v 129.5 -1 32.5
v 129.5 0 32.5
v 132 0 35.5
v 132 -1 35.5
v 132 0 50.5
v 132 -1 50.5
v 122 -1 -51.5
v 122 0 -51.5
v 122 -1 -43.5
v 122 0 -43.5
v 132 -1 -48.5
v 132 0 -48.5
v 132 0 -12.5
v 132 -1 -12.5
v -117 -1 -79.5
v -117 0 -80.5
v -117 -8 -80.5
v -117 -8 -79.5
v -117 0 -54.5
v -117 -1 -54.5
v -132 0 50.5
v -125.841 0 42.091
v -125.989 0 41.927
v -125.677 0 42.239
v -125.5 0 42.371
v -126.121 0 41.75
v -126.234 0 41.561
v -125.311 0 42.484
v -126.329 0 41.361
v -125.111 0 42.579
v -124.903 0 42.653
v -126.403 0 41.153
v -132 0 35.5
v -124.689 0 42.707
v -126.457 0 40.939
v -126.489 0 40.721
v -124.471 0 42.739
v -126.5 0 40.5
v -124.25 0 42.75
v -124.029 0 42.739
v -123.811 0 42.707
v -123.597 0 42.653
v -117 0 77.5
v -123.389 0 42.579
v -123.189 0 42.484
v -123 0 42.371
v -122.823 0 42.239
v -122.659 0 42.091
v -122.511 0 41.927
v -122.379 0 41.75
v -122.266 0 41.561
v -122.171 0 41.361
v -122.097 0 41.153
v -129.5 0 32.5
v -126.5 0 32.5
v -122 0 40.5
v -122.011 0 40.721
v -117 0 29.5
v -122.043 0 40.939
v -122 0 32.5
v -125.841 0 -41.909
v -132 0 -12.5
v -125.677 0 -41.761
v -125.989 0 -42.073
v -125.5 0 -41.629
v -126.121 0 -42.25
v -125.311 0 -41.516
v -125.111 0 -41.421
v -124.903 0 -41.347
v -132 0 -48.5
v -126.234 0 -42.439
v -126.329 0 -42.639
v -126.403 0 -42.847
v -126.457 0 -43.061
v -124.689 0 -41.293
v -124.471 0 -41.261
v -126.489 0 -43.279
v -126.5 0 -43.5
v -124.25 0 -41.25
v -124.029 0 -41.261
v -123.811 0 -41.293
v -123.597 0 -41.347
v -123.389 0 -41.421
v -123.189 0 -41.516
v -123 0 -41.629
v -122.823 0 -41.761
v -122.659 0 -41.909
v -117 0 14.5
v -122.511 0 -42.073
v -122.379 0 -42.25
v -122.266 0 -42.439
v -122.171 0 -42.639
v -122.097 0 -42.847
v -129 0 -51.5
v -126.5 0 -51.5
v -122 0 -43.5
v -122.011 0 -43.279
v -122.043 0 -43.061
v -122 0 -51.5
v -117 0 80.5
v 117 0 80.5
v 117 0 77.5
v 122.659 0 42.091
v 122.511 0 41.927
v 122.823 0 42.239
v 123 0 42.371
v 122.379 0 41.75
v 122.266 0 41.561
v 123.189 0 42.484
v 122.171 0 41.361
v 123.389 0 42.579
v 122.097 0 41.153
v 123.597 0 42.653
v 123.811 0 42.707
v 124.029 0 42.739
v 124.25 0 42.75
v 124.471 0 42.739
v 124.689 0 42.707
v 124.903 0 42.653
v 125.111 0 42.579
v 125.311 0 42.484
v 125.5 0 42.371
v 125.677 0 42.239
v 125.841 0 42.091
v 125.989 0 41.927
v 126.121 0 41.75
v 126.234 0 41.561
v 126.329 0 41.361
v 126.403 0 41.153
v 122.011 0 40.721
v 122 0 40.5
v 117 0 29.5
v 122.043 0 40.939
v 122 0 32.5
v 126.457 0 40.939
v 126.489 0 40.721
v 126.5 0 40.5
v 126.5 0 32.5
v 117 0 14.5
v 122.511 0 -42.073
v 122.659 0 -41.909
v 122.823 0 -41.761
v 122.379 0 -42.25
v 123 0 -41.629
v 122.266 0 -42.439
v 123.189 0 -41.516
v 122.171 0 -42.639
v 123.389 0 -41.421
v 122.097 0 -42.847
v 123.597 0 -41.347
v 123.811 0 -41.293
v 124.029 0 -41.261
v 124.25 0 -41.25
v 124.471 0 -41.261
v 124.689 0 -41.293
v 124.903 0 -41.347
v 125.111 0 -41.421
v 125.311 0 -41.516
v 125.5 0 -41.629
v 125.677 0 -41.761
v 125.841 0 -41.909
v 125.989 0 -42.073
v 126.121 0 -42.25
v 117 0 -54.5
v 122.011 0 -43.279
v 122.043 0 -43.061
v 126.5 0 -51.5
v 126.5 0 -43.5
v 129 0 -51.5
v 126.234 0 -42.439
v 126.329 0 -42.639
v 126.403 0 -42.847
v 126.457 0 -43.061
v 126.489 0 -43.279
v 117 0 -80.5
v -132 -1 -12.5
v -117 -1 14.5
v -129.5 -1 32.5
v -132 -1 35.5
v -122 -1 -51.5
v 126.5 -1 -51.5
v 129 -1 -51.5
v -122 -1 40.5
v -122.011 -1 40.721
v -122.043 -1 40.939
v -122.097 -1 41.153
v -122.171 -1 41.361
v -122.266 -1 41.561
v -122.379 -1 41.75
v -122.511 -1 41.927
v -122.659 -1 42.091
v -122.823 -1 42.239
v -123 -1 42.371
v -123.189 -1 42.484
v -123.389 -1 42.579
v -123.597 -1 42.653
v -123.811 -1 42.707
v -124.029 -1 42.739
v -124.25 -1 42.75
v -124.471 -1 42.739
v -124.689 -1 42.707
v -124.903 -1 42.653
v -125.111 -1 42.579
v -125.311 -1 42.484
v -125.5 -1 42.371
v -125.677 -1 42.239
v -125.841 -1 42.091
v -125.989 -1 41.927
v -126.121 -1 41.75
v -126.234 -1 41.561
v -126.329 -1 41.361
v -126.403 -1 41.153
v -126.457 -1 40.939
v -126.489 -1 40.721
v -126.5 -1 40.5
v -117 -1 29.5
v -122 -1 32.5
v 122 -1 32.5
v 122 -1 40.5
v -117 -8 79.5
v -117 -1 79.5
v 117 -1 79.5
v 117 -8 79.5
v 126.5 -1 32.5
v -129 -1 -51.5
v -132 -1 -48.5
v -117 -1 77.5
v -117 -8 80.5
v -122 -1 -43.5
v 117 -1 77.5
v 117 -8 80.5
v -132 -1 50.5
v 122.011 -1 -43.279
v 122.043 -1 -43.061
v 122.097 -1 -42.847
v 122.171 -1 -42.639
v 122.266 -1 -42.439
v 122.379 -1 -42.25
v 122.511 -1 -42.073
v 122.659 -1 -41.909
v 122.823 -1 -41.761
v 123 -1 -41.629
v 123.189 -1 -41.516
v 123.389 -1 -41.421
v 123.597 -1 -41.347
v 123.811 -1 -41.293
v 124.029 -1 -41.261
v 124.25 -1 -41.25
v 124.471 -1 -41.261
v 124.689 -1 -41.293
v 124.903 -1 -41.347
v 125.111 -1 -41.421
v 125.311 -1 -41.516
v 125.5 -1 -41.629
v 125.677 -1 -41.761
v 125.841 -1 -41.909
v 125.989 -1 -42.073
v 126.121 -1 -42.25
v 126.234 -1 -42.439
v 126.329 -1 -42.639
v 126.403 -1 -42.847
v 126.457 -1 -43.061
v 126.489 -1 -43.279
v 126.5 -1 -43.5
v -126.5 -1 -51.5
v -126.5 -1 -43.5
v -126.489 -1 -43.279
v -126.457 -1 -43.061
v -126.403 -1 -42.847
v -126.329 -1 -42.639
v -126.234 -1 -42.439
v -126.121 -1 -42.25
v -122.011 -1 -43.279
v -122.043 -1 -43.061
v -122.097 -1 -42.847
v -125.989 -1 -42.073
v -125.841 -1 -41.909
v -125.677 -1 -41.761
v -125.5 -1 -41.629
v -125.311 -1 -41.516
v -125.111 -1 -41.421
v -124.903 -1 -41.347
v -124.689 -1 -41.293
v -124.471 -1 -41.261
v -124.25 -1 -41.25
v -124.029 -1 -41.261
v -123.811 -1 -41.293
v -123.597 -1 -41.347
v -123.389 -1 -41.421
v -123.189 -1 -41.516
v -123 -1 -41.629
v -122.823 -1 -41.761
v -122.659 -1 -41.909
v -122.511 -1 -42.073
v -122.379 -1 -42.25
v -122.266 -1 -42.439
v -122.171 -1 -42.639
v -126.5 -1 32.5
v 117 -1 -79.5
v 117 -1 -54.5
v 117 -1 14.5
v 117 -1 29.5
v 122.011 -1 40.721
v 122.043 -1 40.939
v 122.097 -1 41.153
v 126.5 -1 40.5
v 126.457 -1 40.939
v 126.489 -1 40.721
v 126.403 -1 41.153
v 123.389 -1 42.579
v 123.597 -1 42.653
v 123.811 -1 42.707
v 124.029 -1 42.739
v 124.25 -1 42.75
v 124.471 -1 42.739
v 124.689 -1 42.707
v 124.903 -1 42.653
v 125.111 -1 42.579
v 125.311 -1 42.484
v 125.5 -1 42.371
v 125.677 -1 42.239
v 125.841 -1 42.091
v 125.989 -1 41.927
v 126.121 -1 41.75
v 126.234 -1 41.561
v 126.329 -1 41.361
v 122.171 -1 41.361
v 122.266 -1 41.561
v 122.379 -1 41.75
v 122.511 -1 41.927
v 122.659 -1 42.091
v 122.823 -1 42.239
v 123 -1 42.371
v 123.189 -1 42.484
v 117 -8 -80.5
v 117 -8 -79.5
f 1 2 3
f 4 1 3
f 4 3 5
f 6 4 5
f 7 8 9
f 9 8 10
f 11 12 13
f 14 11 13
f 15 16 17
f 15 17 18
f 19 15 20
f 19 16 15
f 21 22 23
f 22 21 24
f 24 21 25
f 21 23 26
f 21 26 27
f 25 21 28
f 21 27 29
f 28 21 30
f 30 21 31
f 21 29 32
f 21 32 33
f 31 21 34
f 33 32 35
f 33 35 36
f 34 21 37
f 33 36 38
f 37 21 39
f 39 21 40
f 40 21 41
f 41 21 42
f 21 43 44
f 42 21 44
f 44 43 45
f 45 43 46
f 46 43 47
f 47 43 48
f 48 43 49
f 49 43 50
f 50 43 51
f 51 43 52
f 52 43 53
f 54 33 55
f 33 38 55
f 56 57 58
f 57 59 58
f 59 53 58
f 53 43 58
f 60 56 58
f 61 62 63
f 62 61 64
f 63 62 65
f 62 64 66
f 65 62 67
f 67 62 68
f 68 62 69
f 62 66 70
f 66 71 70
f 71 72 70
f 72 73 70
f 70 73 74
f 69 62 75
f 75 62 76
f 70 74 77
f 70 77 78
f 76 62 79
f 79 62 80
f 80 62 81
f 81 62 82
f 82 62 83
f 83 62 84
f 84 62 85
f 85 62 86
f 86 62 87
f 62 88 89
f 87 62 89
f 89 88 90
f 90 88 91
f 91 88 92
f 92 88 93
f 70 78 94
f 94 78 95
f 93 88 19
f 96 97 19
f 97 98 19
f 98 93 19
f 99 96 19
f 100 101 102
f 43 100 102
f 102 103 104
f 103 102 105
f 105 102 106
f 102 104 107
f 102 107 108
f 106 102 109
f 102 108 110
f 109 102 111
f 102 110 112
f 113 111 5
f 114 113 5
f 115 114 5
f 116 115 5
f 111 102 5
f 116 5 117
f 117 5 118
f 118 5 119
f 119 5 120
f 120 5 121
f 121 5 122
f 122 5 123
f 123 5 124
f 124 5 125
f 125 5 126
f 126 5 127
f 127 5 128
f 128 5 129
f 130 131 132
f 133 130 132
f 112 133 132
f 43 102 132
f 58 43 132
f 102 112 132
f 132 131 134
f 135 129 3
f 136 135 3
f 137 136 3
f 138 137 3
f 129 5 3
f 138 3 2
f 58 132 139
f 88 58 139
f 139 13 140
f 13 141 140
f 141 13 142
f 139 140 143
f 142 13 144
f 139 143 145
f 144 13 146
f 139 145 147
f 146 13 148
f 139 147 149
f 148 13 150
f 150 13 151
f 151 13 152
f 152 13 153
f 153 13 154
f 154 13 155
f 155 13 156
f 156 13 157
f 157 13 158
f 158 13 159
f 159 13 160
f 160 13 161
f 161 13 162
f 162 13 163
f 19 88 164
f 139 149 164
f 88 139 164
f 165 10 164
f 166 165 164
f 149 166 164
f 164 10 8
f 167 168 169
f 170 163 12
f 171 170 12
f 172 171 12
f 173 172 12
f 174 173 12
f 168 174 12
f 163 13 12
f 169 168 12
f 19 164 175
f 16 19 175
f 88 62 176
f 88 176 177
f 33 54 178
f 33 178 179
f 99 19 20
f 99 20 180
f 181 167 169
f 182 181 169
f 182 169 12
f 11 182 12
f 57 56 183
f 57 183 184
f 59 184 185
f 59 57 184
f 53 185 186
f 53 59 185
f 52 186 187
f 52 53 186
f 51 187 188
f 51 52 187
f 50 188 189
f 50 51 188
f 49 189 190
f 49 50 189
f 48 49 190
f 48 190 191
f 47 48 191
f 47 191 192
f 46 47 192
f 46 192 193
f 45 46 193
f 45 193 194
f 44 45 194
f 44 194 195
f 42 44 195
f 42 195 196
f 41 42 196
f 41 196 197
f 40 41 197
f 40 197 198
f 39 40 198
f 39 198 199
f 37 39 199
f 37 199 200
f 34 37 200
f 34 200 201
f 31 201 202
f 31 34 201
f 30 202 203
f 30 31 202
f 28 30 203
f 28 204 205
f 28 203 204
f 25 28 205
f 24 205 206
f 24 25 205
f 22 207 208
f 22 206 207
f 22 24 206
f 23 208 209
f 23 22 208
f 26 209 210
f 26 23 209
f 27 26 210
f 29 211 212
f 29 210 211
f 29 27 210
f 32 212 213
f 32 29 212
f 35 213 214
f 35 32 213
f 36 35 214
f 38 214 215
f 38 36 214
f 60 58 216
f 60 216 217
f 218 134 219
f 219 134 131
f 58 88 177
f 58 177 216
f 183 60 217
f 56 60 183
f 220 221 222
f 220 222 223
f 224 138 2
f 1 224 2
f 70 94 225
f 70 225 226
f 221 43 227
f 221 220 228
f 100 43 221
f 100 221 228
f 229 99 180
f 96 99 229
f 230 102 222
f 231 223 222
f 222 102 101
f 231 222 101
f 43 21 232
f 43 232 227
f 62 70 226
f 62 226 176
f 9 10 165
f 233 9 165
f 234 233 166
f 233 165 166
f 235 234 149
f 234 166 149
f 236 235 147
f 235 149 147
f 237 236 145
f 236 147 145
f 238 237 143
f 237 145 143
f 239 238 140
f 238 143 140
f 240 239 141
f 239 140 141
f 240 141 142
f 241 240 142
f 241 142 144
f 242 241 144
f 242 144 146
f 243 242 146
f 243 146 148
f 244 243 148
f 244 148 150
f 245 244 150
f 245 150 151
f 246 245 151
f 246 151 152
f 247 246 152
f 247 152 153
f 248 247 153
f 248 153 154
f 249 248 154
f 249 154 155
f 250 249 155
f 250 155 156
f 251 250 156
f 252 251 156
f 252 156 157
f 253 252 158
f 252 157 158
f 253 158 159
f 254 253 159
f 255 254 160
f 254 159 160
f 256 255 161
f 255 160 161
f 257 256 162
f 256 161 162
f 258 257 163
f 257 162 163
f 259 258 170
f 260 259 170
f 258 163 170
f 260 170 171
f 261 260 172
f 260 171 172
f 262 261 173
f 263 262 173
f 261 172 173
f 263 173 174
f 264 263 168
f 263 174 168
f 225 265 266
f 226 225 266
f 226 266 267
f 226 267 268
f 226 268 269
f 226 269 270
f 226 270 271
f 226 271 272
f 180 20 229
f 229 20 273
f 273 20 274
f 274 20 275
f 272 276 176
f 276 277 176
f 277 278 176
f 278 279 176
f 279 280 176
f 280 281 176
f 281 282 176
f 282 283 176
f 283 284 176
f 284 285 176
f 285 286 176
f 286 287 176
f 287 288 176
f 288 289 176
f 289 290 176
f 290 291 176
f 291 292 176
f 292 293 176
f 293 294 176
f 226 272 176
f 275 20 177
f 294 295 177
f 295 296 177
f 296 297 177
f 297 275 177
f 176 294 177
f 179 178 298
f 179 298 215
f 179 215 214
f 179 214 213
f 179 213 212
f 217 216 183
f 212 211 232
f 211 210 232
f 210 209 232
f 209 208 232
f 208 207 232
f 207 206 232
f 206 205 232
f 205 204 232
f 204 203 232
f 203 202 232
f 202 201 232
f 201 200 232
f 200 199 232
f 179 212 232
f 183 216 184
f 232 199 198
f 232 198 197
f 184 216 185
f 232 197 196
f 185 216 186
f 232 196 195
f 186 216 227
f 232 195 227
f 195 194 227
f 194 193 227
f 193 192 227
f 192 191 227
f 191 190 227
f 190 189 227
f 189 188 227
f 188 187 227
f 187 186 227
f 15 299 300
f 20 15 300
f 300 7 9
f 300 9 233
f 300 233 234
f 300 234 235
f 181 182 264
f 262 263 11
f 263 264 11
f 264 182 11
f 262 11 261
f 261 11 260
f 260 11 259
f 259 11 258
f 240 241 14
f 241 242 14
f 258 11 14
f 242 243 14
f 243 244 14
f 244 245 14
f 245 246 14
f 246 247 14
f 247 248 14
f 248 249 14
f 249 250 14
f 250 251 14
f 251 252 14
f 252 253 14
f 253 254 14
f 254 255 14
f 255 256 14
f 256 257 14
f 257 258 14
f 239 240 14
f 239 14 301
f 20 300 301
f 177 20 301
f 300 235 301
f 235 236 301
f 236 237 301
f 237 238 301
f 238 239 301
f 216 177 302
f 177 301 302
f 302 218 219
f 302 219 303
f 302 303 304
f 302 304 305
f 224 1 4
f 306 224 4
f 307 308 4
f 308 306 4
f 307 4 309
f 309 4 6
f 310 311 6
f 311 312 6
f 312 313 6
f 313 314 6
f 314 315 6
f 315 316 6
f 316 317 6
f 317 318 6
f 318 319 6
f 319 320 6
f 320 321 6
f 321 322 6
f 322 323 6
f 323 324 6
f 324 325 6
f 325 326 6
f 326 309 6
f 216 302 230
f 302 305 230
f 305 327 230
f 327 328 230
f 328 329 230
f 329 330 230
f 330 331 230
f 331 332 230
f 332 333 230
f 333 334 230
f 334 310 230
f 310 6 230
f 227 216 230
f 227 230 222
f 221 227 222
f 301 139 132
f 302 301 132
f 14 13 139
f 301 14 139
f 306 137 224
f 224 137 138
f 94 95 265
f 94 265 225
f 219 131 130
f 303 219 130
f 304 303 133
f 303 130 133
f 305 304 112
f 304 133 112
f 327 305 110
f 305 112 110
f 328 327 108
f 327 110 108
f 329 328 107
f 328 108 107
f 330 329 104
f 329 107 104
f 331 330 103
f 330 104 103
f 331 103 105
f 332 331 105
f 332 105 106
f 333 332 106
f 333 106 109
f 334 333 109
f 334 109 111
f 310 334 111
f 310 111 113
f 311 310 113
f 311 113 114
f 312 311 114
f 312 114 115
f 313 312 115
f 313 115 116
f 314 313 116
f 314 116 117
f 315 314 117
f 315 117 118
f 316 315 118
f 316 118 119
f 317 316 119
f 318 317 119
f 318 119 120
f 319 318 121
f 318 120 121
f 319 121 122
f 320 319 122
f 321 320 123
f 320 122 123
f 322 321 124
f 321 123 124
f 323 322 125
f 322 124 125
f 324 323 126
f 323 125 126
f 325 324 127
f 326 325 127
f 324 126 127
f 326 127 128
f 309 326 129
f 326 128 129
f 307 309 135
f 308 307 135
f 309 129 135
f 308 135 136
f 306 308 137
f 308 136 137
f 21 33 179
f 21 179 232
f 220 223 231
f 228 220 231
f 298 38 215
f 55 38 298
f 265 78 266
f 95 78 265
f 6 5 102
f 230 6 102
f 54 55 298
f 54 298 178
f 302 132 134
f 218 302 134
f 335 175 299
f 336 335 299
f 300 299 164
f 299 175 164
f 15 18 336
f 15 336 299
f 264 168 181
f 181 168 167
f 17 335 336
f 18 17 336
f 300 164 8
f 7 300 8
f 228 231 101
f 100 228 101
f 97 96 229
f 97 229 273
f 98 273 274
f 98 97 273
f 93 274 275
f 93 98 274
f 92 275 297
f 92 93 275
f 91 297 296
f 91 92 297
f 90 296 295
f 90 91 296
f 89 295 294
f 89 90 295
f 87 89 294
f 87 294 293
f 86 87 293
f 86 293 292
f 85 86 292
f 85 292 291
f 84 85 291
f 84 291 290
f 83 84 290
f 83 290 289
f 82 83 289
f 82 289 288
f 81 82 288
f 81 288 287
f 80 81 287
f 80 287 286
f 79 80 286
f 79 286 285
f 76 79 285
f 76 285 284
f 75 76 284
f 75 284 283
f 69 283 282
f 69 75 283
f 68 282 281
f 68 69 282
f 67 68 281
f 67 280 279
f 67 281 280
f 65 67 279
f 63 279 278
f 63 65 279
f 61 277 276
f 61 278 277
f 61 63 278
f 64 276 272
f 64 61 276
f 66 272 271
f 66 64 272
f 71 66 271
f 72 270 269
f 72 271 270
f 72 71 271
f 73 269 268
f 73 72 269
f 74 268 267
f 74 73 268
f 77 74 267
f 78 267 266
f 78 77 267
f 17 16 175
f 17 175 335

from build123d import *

# Parameters (mm, degrees)
EXTRUDE_THIN1_DEPTH = 132
CUT_EXTRUDE1_DEPTH  = 10


with BuildPart() as part:
    # Sketch1 → Extrude-Thin1 (new, symmetric)
    with BuildSketch(Plane(origin=(0, 0, 0), x_dir=(0, 0, -1), z_dir=(1, 0, 0))):
        Polygon((-80.5, -8), (-80.5, 0), (80.5, 0), (80.5, -8), (79.5, -8), (79.5, -1), (-79.5, -1), (-79.5, -8), align=None)
    extrude(amount=EXTRUDE_THIN1_DEPTH, both=True)

    # Sketch2 → Cut-Extrude1 (cut)
    with BuildSketch(Plane(origin=(0, 0, 0), x_dir=(1, 0, 0), z_dir=(0, 1, 0))):
        with BuildLine():
            Line((-117, 80.5), (-117, 54.5))
            Line((-117, 54.5), (-122, 51.5))
            Line((-122, 51.5), (-122, 43.5))
            ThreePointArc((-122, 43.5), (-124.25, 41.25), (-126.5, 43.5))
            Line((-126.5, 43.5), (-126.5, 51.5))
            Line((-126.5, 51.5), (-129, 51.5))
            Line((-129, 51.5), (-132, 48.5))
            Line((-132, 48.5), (-132, 12.5))
            Line((-132, 12.5), (-117, -14.5))
            Line((-117, -14.5), (-117, -29.5))
            Line((-117, -29.5), (-122, -32.5))
            Line((-122, -32.5), (-122, -40.5))
            ThreePointArc((-122, -40.5), (-124.25, -42.75), (-126.5, -40.5))
            Line((-126.5, -40.5), (-126.5, -32.5))
            Line((-126.5, -32.5), (-129.5, -32.5))
            Line((-129.5, -32.5), (-132, -35.5))
            Line((-132, -35.5), (-132, -50.5))
            Line((-132, -50.5), (-117, -77.5))
            Line((-117, -77.5), (-117, -80.5))
            Line((-117, -80.5), (-140, -80.5))
            Line((-140, -80.5), (-140, 80.5))
            Line((-140, 80.5), (-117, 80.5))
        make_face()
    cut_extrude1 = extrude(amount=-CUT_EXTRUDE1_DEPTH, mode=Mode.SUBTRACT)

    # Mirror1: Cut-Extrude1 across plane
    add(cut_extrude1.mirror(Plane(origin=(0, 0, 0), x_dir=(0, 0, 1), z_dir=(1, 0, 0))), mode=Mode.SUBTRACT)


solid = part.part
